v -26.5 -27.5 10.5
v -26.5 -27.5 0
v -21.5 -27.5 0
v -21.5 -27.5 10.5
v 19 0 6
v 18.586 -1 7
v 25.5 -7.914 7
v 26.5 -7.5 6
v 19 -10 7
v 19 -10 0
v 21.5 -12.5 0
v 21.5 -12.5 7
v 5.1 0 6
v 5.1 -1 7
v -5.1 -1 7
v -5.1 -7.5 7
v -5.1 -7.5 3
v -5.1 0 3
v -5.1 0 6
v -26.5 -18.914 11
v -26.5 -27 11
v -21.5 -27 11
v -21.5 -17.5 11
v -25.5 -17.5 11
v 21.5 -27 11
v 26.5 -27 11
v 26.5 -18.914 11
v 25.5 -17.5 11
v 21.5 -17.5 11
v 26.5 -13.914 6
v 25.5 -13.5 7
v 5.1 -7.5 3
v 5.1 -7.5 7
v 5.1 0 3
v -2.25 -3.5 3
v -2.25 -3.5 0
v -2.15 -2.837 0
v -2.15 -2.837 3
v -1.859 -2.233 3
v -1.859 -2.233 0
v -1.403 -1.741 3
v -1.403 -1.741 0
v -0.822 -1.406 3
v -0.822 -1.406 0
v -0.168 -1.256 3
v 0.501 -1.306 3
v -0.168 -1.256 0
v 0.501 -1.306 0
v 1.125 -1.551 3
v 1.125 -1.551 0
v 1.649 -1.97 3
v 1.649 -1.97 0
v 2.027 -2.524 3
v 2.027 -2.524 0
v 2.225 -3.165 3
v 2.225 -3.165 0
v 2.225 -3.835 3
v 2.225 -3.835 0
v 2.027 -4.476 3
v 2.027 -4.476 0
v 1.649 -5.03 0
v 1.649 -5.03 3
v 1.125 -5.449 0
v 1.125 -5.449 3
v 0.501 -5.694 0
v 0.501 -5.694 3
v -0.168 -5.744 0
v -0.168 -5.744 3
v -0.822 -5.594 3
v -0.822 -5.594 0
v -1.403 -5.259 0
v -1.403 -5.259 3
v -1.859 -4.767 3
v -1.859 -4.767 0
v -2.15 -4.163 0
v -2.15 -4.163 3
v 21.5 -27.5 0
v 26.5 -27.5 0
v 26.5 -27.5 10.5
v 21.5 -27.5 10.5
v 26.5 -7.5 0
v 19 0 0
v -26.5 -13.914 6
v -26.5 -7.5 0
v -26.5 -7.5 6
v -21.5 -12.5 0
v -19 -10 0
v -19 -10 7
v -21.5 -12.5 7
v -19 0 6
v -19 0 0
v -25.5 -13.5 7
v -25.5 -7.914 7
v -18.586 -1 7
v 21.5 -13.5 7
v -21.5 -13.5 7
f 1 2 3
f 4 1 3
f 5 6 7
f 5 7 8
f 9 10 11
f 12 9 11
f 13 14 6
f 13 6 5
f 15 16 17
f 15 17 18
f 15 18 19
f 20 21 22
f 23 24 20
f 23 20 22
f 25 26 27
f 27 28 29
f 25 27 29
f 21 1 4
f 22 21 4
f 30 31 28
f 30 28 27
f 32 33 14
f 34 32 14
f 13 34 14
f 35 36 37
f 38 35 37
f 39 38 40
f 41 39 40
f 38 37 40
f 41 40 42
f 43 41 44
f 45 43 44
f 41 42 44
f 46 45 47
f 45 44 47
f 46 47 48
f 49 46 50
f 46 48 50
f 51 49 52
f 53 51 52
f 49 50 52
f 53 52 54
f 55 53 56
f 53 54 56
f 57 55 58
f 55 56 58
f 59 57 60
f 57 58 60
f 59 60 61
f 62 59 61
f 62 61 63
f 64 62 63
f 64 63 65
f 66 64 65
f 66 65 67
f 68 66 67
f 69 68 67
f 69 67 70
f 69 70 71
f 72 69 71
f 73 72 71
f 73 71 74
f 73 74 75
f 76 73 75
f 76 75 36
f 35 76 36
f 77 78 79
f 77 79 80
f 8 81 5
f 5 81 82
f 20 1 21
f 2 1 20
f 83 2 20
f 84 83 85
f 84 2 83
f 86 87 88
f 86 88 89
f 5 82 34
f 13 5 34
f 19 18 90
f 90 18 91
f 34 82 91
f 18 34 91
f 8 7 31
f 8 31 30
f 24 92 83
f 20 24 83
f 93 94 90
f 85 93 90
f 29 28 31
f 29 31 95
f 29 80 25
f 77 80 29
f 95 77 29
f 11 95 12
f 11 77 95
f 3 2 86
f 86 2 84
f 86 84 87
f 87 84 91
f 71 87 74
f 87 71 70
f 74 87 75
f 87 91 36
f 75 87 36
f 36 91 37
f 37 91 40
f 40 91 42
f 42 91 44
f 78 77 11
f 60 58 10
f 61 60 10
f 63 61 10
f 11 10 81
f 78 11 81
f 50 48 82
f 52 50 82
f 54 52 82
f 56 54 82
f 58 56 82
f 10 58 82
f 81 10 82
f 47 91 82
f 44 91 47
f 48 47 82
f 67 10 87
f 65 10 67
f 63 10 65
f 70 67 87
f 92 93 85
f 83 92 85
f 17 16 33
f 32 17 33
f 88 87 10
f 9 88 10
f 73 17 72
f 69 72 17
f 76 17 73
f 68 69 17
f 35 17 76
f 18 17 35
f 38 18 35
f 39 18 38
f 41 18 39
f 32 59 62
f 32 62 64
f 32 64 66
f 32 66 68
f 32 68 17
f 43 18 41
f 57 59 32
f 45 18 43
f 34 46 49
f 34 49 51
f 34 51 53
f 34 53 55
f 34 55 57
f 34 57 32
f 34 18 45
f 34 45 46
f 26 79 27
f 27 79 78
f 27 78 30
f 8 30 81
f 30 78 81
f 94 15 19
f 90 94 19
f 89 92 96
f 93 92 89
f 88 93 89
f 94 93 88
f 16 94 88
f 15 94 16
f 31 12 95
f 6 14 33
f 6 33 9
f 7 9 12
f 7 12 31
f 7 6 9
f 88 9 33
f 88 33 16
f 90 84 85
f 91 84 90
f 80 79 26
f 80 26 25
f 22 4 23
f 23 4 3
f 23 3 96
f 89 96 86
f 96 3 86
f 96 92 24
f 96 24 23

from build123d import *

# Parameters (mm, degrees)
BOSS_EXTRUDE1_DEPTH  = 7
SKETCH6_W            = 5
SKETCH6_H            = 10
BOSS_EXTRUDE2_DEPTH  = 4
SKETCH3_W            = 5.1
SKETCH3_H            = 7.5
CUT_EXTRUDE1_DEPTH   = 4
M4_CLEARANCE_HOLE1_D = 4.5
CHAMFER2_SIZE        = 4
CHAMFER5_SIZE        = 0.5


# Some blends are built 0.0001 mm under size
with BuildPart() as part:
    # Sketch1 → Boss-Extrude1 (new body)
    with BuildSketch(Plane.XY):
        Polygon((0, 0), (0, -10), (-19, -10), (-21.5, -12.5), (-21.5, -27.5), (-26.5, -27.5), (-26.5, -7.5), (-19, 0), align=None)
    boss_extrude1 = extrude(amount=BOSS_EXTRUDE1_DEPTH)

    # Sketch6 → Boss-Extrude2 (add)
    with BuildSketch(Plane.XY.offset(7)):
        with Locations((-24, -22.5)):
            Rectangle(SKETCH6_W, SKETCH6_H)
    boss_extrude2 = extrude(amount=BOSS_EXTRUDE2_DEPTH)

    # Sketch3 → Cut-Extrude1 (cut)
    with BuildSketch(Plane.XY.offset(7)):
        with Locations((-2.55, -3.75)):
            Rectangle(SKETCH3_W, SKETCH3_H)
    cut_extrude1 = extrude(amount=-CUT_EXTRUDE1_DEPTH, mode=Mode.SUBTRACT)

    # Mirror1: Boss-Extrude1, Boss-Extrude2, Cut-Extrude1 across plane
    add(boss_extrude1.mirror(Plane(origin=(0, 0, 7), x_dir=(0, 0, 1), z_dir=(-1, 0, 0))))
    add(boss_extrude2.mirror(Plane(origin=(0, 0, 7), x_dir=(0, 0, 1), z_dir=(-1, 0, 0))))
    add(cut_extrude1.mirror(Plane(origin=(0, 0, 7), x_dir=(0, 0, 1), z_dir=(-1, 0, 0))), mode=Mode.SUBTRACT)

    # M4 Clearance Hole1 (through all)
    with Locations(Plane.XY.offset(3)):
        with Locations((0, -3.5)):
            Hole(M4_CLEARANCE_HOLE1_D / 2)

    # Chamfer2
    chamfer2_edges = [part.edges().sort_by_distance(p)[0] for p in [
        (-24, -17.5, 7),
        (24, -17.5, 7),
    ]]
    chamfer(chamfer2_edges, length=CHAMFER2_SIZE - 0.0001)  # a hair under: the kernel refuses the full size

    # Chamfer4
    # the kernel refuses this chamfer: 1 mm, written as the material it takes off along each edge
    with BuildSketch(Plane(origin=(26.5, -11.68164552, 5.18154552), x_dir=(-0.9996219169112968, 0.019442520806014118, 0.01944252080601436), z_dir=(0, -0.7071067811865476, 0.7071067811865476))) as chamfer4_piece_1_section:
        with BuildLine():
            Line((1.028673195, 0), (-0.056547155, 1.027117794))
            Line((-0.056547155, 1.027117794), (-0.076539593, 1.026567876))
            ThreePointArc((-0.076539593, 1.026567876), (-0.034129227, 0.51339783), (-0.019992438, -0.000549918))
            Line((-0.019992438, -0.000549918), (0.000549918, -0.019992438))
            ThreePointArc((0.000549918, -0.019992438), (0.514497665, -0.00585565), (1.029223113, -0.019992438))
            Line((1.029223113, -0.019992438), (1.028673195, 0))
        make_face()
    chamfer4_piece_1 = extrude(amount=10.800078804, mode=Mode.PRIVATE)
    chamfer4_piece_1 = split(chamfer4_piece_1, bisect_by=Plane(origin=(26.156619069, -15.715277747, 7), z_dir=(0, 0, 1)), keep=Keep.TOP, mode=Mode.PRIVATE)
    add(chamfer4_piece_1, mode=Mode.SUBTRACT)
    with BuildSketch(Plane(origin=(-26.5, -11.68164552, 5.18154552), x_dir=(0.9996219169112968, 0.019442520806013806, 0.019442520806013806), z_dir=(0, -0.7071067811865476, 0.7071067811865476))) as chamfer4_piece_2_section:
        with BuildLine():
            Line((1.028673195, 0), (-0.056547155, -1.027117794))
            Line((-0.056547155, -1.027117794), (-0.076539593, -1.026567876))
            ThreePointArc((-0.076539593, -1.026567876), (-0.034129227, -0.51339783), (-0.019992438, 0.000549918))
            Line((-0.019992438, 0.000549918), (0.000549918, 0.019992438))
            ThreePointArc((0.000549918, 0.019992438), (0.514497665, 0.00585565), (1.029223113, 0.019992438))
            Line((1.029223113, 0.019992438), (1.028673195, 0))
        make_face()
    chamfer4_piece_2 = extrude(amount=10.800078804, mode=Mode.PRIVATE)
    chamfer4_piece_2 = split(chamfer4_piece_2, bisect_by=Plane(origin=(-26.156619069, -15.715277747, 7), z_dir=(0, 0, 1)), keep=Keep.TOP, mode=Mode.PRIVATE)
    add(chamfer4_piece_2, mode=Mode.SUBTRACT)
    with BuildSketch(Plane(origin=(-28.31845448, -9.31845448, 7), x_dir=(0.7068394360706726, -0.7068394360706746, 0.027495876610586528), z_dir=(0.7071067811865485, 0.7071067811865466, 0))) as chamfer4_piece_3:
        with BuildLine():
            Line((1.028673195, 0), (-0.056547155, 1.027117794))
            Line((-0.056547155, 1.027117794), (-0.076539593, 1.026567876))
            ThreePointArc((-0.076539593, 1.026567876), (-0.034129227, 0.51339783), (-0.019992438, -0.000549918))
            Line((-0.019992438, -0.000549918), (0.000549918, -0.019992438))
            ThreePointArc((0.000549918, -0.019992438), (0.514497665, -0.00585565), (1.029223113, -0.019992438))
            Line((1.029223113, -0.019992438), (1.028673195, 0))
        make_face()
    extrude(amount=15.749967694, mode=Mode.SUBTRACT)
    with BuildSketch(Plane(origin=(-26.5, -16.071782988, 7), x_dir=(0.9996219169112968, 0, 0.02749587661058651), z_dir=(0, 1, 0))) as chamfer4_piece_4_section:
        with BuildLine():
            Line((1.028673195, 0), (-0.056547155, 1.027117794))
            Line((-0.056547155, 1.027117794), (-0.076539593, 1.026567876))
            ThreePointArc((-0.076539593, 1.026567876), (-0.034129227, 0.51339783), (-0.019992438, -0.000549918))
            Line((-0.019992438, -0.000549918), (0.000549918, -0.019992438))
            ThreePointArc((0.000549918, -0.019992438), (0.514497665, -0.00585565), (1.029223113, -0.019992438))
            Line((1.029223113, -0.019992438), (1.028673195, 0))
        make_face()
    chamfer4_piece_4 = extrude(amount=11.143465976, mode=Mode.PRIVATE)
    chamfer4_piece_4 = split(chamfer4_piece_4, bisect_by=Plane(origin=(-26.166087376, -11.115587602, 4.615487602), z_dir=(0, 0.7071067811865476, 0.7071067811865476)), keep=Keep.TOP, mode=Mode.PRIVATE)
    add(chamfer4_piece_4, mode=Mode.SUBTRACT)
    with BuildSketch(Plane(origin=(-21.571682988, 0, 7), x_dir=(0, -0.9996219169112968, 0.027495876610586494), z_dir=(1, 0, 0))) as chamfer4_piece_5:
        with BuildLine():
            Line((1.028673195, 0), (-0.056547155, 1.027117794))
            Line((-0.056547155, 1.027117794), (-0.076539593, 1.026567876))
            ThreePointArc((-0.076539593, 1.026567876), (-0.034129227, 0.51339783), (-0.019992438, -0.000549918))
            Line((-0.019992438, -0.000549918), (0.000549918, -0.019992438))
            ThreePointArc((0.000549918, -0.019992438), (0.514497665, -0.00585565), (1.029223113, -0.019992438))
            Line((1.029223113, -0.019992438), (1.028673195, 0))
        make_face()
    extrude(amount=19.043365976, mode=Mode.SUBTRACT)
    with BuildSketch(Plane(origin=(26.5, -16.071782988, 7), x_dir=(-0.9996219169112968, 0, 0.02749587661058651), z_dir=(0, 1, 0))) as chamfer4_piece_6_section:
        with BuildLine():
            Line((1.028673195, 0), (-0.056547155, -1.027117794))
            Line((-0.056547155, -1.027117794), (-0.076539593, -1.026567876))
            ThreePointArc((-0.076539593, -1.026567876), (-0.034129227, -0.51339783), (-0.019992438, 0.000549918))
            Line((-0.019992438, 0.000549918), (0.000549918, 0.019992438))
            ThreePointArc((0.000549918, 0.019992438), (0.514497665, 0.00585565), (1.029223113, 0.019992438))
            Line((1.029223113, 0.019992438), (1.028673195, 0))
        make_face()
    chamfer4_piece_6 = extrude(amount=11.143465976, mode=Mode.PRIVATE)
    chamfer4_piece_6 = split(chamfer4_piece_6, bisect_by=Plane(origin=(26.166087376, -11.115587602, 4.615487602), z_dir=(0, 0.7071067811865476, 0.7071067811865476)), keep=Keep.TOP, mode=Mode.PRIVATE)
    add(chamfer4_piece_6, mode=Mode.SUBTRACT)
    with BuildSketch(Plane(origin=(28.31845448, -9.31845448, 7), x_dir=(-0.7068394360706725, -0.7068394360706747, 0.027495876610586528), z_dir=(-0.7071067811865487, 0.7071067811865464, 0))) as chamfer4_piece_7:
        with BuildLine():
            Line((1.028673195, 0), (-0.056547155, -1.027117794))
            Line((-0.056547155, -1.027117794), (-0.076539593, -1.026567876))
            ThreePointArc((-0.076539593, -1.026567876), (-0.034129227, -0.51339783), (-0.019992438, 0.000549918))
            Line((-0.019992438, 0.000549918), (0.000549918, 0.019992438))
            ThreePointArc((0.000549918, 0.019992438), (0.514497665, 0.00585565), (1.029223113, 0.019992438))
            Line((1.029223113, 0.019992438), (1.028673195, 0))
        make_face()
    extrude(amount=15.749967694, mode=Mode.SUBTRACT)
    with BuildSketch(Plane(origin=(21.571682988, 0, 7), x_dir=(0, -0.9996219169112968, 0.027495876610586494), z_dir=(-1, 0, 0))) as chamfer4_piece_8:
        with BuildLine():
            Line((1.028673195, 0), (-0.056547155, -1.027117794))
            Line((-0.056547155, -1.027117794), (-0.076539593, -1.026567876))
            ThreePointArc((-0.076539593, -1.026567876), (-0.034129227, -0.51339783), (-0.019992438, 0.000549918))
            Line((-0.019992438, 0.000549918), (0.000549918, 0.019992438))
            ThreePointArc((0.000549918, 0.019992438), (0.514497665, 0.00585565), (1.029223113, 0.019992438))
            Line((1.029223113, 0.019992438), (1.028673195, 0))
        make_face()
    extrude(amount=19.043365976, mode=Mode.SUBTRACT)
    with BuildSketch(Plane(origin=(26.5, -16.071782988, 7), x_dir=(-0.9996219169112968, 0, 0.02749587661058651), z_dir=(0, 1, 0))) as chamfer4_piece_9a_section:
        with BuildLine():
            Line((1.028673195, 0), (-0.056547155, -1.027117794))
            Line((-0.056547155, -1.027117794), (-0.076539593, -1.026567876))
            ThreePointArc((-0.076539593, -1.026567876), (-0.034129227, -0.51339783), (-0.019992438, 0.000549918))
            Line((-0.019992438, 0.000549918), (0.000549918, 0.019992438))
            ThreePointArc((0.000549918, 0.019992438), (0.514497665, 0.00585565), (1.029223113, 0.019992438))
            Line((1.029223113, 0.019992438), (1.028673195, 0))
        make_face()
    chamfer4_piece_9a = extrude(amount=11.143465976, mode=Mode.PRIVATE)
    chamfer4_piece_9a = split(chamfer4_piece_9a, bisect_by=Plane(origin=(26.181906875, -13.879260813, 7.379160813), z_dir=(0, -0.7071067811865476, -0.7071067811865476)), keep=Keep.TOP, mode=Mode.PRIVATE)
    with BuildSketch(Plane(origin=(26.5, -11.68164552, 5.18154552), x_dir=(-0.9996219169112968, 0.019442520806014118, 0.01944252080601436), z_dir=(0, -0.7071067811865476, 0.7071067811865476))) as chamfer4_piece_9b_section:
        with BuildLine():
            Line((1.028673195, 0), (-0.056547155, 1.027117794))
            Line((-0.056547155, 1.027117794), (-0.076539593, 1.026567876))
            ThreePointArc((-0.076539593, 1.026567876), (-0.034129227, 0.51339783), (-0.019992438, -0.000549918))
            Line((-0.019992438, -0.000549918), (0.000549918, -0.019992438))
            ThreePointArc((0.000549918, -0.019992438), (0.514497665, -0.00585565), (1.029223113, -0.019992438))
            Line((1.029223113, -0.019992438), (1.028673195, 0))
        make_face()
    chamfer4_piece_9b = extrude(amount=10.800078804, mode=Mode.PRIVATE)
    chamfer4_piece_9b = split(chamfer4_piece_9b, bisect_by=Plane(origin=(26.181906875, -12.963885635, 7), z_dir=(0, 0, -1)), keep=Keep.TOP, mode=Mode.PRIVATE)
    chamfer4_piece_9 = chamfer4_piece_9a & chamfer4_piece_9b
    add(chamfer4_piece_9, mode=Mode.SUBTRACT)
    with BuildSketch(Plane(origin=(-26.5, -16.071782988, 7), x_dir=(0.9996219169112968, 0, 0.02749587661058651), z_dir=(0, 1, 0))) as chamfer4_piece_10a_section:
        with BuildLine():
            Line((1.028673195, 0), (-0.056547155, 1.027117794))
            Line((-0.056547155, 1.027117794), (-0.076539593, 1.026567876))
            ThreePointArc((-0.076539593, 1.026567876), (-0.034129227, 0.51339783), (-0.019992438, -0.000549918))
            Line((-0.019992438, -0.000549918), (0.000549918, -0.019992438))
            ThreePointArc((0.000549918, -0.019992438), (0.514497665, -0.00585565), (1.029223113, -0.019992438))
            Line((1.029223113, -0.019992438), (1.028673195, 0))
        make_face()
    chamfer4_piece_10a = extrude(amount=11.143465976, mode=Mode.PRIVATE)
    chamfer4_piece_10a = split(chamfer4_piece_10a, bisect_by=Plane(origin=(-26.181906875, -13.879260813, 7.379160813), z_dir=(0, -0.7071067811865476, -0.7071067811865476)), keep=Keep.TOP, mode=Mode.PRIVATE)
    with BuildSketch(Plane(origin=(-26.5, -11.68164552, 5.18154552), x_dir=(0.9996219169112968, 0.019442520806013806, 0.019442520806013806), z_dir=(0, -0.7071067811865476, 0.7071067811865476))) as chamfer4_piece_10b_section:
        with BuildLine():
            Line((1.028673195, 0), (-0.056547155, -1.027117794))
            Line((-0.056547155, -1.027117794), (-0.076539593, -1.026567876))
            ThreePointArc((-0.076539593, -1.026567876), (-0.034129227, -0.51339783), (-0.019992438, 0.000549918))
            Line((-0.019992438, 0.000549918), (0.000549918, 0.019992438))
            ThreePointArc((0.000549918, 0.019992438), (0.514497665, 0.00585565), (1.029223113, 0.019992438))
            Line((1.029223113, 0.019992438), (1.028673195, 0))
        make_face()
    chamfer4_piece_10b = extrude(amount=10.800078804, mode=Mode.PRIVATE)
    chamfer4_piece_10b = split(chamfer4_piece_10b, bisect_by=Plane(origin=(-26.181906875, -12.963885635, 7), z_dir=(0, 0, -1)), keep=Keep.TOP, mode=Mode.PRIVATE)
    chamfer4_piece_10 = chamfer4_piece_10a & chamfer4_piece_10b
    add(chamfer4_piece_10, mode=Mode.SUBTRACT)

    # Chamfer5
    chamfer5_edges = [part.edges().sort_by_distance(p)[0] for p in [
        (-24, -27.5, 11),
        (24, -27.5, 11),
    ]]
    chamfer(chamfer5_edges, length=CHAMFER5_SIZE)


solid = part.part
